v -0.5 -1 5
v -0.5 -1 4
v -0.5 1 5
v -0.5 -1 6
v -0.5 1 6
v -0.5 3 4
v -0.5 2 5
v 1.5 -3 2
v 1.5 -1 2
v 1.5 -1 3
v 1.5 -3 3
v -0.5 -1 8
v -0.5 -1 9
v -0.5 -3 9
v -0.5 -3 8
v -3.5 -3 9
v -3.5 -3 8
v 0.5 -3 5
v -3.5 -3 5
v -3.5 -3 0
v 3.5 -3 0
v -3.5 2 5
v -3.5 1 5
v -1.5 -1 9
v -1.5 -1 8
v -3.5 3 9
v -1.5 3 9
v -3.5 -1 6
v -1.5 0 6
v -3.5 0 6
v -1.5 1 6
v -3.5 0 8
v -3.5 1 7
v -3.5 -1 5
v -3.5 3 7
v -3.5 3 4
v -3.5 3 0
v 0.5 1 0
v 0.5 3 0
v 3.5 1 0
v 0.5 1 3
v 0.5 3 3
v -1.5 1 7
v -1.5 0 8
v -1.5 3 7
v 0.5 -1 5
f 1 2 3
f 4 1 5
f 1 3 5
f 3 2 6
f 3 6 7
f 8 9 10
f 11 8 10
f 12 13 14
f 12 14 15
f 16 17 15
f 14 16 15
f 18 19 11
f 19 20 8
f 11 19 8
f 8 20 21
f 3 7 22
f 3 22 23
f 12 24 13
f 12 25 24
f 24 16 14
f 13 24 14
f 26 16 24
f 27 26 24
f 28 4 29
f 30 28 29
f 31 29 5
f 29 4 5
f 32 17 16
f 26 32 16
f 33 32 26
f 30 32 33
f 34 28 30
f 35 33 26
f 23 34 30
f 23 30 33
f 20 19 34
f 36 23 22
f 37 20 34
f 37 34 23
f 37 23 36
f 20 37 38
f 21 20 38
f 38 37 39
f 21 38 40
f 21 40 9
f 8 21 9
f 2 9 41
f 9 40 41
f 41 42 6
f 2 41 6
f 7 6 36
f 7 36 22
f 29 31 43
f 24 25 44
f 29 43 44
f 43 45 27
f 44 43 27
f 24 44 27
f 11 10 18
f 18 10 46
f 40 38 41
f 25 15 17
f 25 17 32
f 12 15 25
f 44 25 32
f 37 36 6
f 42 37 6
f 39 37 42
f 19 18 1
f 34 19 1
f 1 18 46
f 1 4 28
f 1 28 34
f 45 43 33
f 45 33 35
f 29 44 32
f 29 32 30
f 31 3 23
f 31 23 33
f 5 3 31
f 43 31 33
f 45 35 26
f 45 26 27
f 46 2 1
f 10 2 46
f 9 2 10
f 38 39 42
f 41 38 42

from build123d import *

# Parameters (mm, degrees)
SKETCH1_W           = 7
SKETCH1_H           = 6
BOSS_EXTRUDE1_DEPTH = 9
CUT_EXTRUDE1_DEPTH  = 2
CUT_EXTRUDE3_DEPTH  = 4
CUT_EXTRUDE4_DEPTH  = 7
SKETCH5_W           = 3
SKETCH5_H           = 2
CUT_EXTRUDE5_DEPTH  = 5
CUT_EXTRUDE8_DEPTH  = 4
CUT_EXTRUDE9_DEPTH  = 4
SKETCH11_W          = 2
SKETCH11_H          = 1
CUT_EXTRUDE12_DEPTH = 4
CUT_EXTRUDE13_DEPTH = 1
SKETCH13_W          = 1
SKETCH13_H          = 1
CUT_EXTRUDE14_DEPTH = 3


with BuildPart() as part:
    # Sketch1 → Boss-Extrude1 (new body)
    with BuildSketch(Plane.XY):
        Rectangle(SKETCH1_W, SKETCH1_H)
    extrude(amount=BOSS_EXTRUDE1_DEPTH)

    # Sketch2 → Cut-Extrude1 (cut)
    with BuildSketch(Plane(origin=(0, 3, 0), x_dir=(1, 0, 0), z_dir=(0, 1, 0))):
        Polygon((3.5, 0), (0.5, 0), (0.5, -3), align=None)
    extrude(amount=-CUT_EXTRUDE1_DEPTH, mode=Mode.SUBTRACT)

    # Sketch3 → Cut-Extrude3 (cut)
    with BuildSketch(Plane(origin=(0, 3, 0), x_dir=(1, 0, 0), z_dir=(0, 1, 0))):
        Polygon((3.5, 0), (0.5, -3), (0.5, -9), (3.5, -9), align=None)
    extrude(amount=-CUT_EXTRUDE3_DEPTH, mode=Mode.SUBTRACT)

    # Sketch4 → Cut-Extrude4 (cut, through all)
    with BuildSketch(Plane(origin=(0, 3, 0), x_dir=(1, 0, 0), z_dir=(0, 1, 0))):
        Polygon((3.5, 0), (1.5, -2), (1.5, -3), (0.5, -5), (0.5, -9), (3.5, -9), align=None)
    extrude(amount=-CUT_EXTRUDE4_DEPTH, mode=Mode.SUBTRACT)

    # Sketch5 → Cut-Extrude5 (cut, through all)
    with BuildSketch(Plane(origin=(0.5, 0, 0), x_dir=(0, 0, -1), z_dir=(1, 0, 0))):
        with Locations((-6.5, -2)):
            Rectangle(SKETCH5_W, SKETCH5_H)
    extrude(amount=-CUT_EXTRUDE5_DEPTH, mode=Mode.SUBTRACT)

    # Sketch7 → Cut-Extrude8 (cut)
    with BuildSketch(Plane(origin=(0, 3, 0), x_dir=(1, 0, 0), z_dir=(0, 1, 0))):
        Polygon((0.5, -3), (-0.5, -4), (-0.5, -9), (0.5, -9), align=None)
    extrude(amount=-CUT_EXTRUDE8_DEPTH, mode=Mode.SUBTRACT)

    # Sketch8 → Cut-Extrude9 (cut, through all)
    with BuildSketch(Plane(origin=(-0.5, 0, 0), x_dir=(0, 0, -1), z_dir=(1, 0, 0))):
        Polygon((-4, 3), (-5, 2), (-5, 1), (-7, 1), (-7, 3), align=None)
    extrude(amount=-CUT_EXTRUDE9_DEPTH, mode=Mode.SUBTRACT)

    # Sketch11 → Cut-Extrude12 (cut, through all)
    with BuildSketch(Plane(origin=(-0.5, 0, 0), x_dir=(0, 0, -1), z_dir=(1, 0, 0))):
        with Locations((-7, -0.5)):
            Rectangle(SKETCH11_W, SKETCH11_H)
    extrude(amount=-CUT_EXTRUDE12_DEPTH, mode=Mode.SUBTRACT)

    # Sketch12 → Cut-Extrude13 (cut)
    with BuildSketch(Plane(origin=(-0.5, 0, 0), x_dir=(0, 0, -1), z_dir=(1, 0, 0))):
        Polygon((-9, 3), (-7, 3), (-7, 1), (-6, 1), (-6, 0), (-8, 0), (-8, -1), (-9, -1), align=None)
    extrude(amount=-CUT_EXTRUDE13_DEPTH, mode=Mode.SUBTRACT)

    # Sketch13 → Cut-Extrude14 (cut, through all)
    with BuildSketch(Plane(origin=(0, -1, 0), x_dir=(1, 0, 0), z_dir=(0, 1, 0))):
        with Locations((0, -8.5)):
            Rectangle(SKETCH13_W, SKETCH13_H)
    extrude(amount=-CUT_EXTRUDE14_DEPTH, mode=Mode.SUBTRACT)


solid = part.part
